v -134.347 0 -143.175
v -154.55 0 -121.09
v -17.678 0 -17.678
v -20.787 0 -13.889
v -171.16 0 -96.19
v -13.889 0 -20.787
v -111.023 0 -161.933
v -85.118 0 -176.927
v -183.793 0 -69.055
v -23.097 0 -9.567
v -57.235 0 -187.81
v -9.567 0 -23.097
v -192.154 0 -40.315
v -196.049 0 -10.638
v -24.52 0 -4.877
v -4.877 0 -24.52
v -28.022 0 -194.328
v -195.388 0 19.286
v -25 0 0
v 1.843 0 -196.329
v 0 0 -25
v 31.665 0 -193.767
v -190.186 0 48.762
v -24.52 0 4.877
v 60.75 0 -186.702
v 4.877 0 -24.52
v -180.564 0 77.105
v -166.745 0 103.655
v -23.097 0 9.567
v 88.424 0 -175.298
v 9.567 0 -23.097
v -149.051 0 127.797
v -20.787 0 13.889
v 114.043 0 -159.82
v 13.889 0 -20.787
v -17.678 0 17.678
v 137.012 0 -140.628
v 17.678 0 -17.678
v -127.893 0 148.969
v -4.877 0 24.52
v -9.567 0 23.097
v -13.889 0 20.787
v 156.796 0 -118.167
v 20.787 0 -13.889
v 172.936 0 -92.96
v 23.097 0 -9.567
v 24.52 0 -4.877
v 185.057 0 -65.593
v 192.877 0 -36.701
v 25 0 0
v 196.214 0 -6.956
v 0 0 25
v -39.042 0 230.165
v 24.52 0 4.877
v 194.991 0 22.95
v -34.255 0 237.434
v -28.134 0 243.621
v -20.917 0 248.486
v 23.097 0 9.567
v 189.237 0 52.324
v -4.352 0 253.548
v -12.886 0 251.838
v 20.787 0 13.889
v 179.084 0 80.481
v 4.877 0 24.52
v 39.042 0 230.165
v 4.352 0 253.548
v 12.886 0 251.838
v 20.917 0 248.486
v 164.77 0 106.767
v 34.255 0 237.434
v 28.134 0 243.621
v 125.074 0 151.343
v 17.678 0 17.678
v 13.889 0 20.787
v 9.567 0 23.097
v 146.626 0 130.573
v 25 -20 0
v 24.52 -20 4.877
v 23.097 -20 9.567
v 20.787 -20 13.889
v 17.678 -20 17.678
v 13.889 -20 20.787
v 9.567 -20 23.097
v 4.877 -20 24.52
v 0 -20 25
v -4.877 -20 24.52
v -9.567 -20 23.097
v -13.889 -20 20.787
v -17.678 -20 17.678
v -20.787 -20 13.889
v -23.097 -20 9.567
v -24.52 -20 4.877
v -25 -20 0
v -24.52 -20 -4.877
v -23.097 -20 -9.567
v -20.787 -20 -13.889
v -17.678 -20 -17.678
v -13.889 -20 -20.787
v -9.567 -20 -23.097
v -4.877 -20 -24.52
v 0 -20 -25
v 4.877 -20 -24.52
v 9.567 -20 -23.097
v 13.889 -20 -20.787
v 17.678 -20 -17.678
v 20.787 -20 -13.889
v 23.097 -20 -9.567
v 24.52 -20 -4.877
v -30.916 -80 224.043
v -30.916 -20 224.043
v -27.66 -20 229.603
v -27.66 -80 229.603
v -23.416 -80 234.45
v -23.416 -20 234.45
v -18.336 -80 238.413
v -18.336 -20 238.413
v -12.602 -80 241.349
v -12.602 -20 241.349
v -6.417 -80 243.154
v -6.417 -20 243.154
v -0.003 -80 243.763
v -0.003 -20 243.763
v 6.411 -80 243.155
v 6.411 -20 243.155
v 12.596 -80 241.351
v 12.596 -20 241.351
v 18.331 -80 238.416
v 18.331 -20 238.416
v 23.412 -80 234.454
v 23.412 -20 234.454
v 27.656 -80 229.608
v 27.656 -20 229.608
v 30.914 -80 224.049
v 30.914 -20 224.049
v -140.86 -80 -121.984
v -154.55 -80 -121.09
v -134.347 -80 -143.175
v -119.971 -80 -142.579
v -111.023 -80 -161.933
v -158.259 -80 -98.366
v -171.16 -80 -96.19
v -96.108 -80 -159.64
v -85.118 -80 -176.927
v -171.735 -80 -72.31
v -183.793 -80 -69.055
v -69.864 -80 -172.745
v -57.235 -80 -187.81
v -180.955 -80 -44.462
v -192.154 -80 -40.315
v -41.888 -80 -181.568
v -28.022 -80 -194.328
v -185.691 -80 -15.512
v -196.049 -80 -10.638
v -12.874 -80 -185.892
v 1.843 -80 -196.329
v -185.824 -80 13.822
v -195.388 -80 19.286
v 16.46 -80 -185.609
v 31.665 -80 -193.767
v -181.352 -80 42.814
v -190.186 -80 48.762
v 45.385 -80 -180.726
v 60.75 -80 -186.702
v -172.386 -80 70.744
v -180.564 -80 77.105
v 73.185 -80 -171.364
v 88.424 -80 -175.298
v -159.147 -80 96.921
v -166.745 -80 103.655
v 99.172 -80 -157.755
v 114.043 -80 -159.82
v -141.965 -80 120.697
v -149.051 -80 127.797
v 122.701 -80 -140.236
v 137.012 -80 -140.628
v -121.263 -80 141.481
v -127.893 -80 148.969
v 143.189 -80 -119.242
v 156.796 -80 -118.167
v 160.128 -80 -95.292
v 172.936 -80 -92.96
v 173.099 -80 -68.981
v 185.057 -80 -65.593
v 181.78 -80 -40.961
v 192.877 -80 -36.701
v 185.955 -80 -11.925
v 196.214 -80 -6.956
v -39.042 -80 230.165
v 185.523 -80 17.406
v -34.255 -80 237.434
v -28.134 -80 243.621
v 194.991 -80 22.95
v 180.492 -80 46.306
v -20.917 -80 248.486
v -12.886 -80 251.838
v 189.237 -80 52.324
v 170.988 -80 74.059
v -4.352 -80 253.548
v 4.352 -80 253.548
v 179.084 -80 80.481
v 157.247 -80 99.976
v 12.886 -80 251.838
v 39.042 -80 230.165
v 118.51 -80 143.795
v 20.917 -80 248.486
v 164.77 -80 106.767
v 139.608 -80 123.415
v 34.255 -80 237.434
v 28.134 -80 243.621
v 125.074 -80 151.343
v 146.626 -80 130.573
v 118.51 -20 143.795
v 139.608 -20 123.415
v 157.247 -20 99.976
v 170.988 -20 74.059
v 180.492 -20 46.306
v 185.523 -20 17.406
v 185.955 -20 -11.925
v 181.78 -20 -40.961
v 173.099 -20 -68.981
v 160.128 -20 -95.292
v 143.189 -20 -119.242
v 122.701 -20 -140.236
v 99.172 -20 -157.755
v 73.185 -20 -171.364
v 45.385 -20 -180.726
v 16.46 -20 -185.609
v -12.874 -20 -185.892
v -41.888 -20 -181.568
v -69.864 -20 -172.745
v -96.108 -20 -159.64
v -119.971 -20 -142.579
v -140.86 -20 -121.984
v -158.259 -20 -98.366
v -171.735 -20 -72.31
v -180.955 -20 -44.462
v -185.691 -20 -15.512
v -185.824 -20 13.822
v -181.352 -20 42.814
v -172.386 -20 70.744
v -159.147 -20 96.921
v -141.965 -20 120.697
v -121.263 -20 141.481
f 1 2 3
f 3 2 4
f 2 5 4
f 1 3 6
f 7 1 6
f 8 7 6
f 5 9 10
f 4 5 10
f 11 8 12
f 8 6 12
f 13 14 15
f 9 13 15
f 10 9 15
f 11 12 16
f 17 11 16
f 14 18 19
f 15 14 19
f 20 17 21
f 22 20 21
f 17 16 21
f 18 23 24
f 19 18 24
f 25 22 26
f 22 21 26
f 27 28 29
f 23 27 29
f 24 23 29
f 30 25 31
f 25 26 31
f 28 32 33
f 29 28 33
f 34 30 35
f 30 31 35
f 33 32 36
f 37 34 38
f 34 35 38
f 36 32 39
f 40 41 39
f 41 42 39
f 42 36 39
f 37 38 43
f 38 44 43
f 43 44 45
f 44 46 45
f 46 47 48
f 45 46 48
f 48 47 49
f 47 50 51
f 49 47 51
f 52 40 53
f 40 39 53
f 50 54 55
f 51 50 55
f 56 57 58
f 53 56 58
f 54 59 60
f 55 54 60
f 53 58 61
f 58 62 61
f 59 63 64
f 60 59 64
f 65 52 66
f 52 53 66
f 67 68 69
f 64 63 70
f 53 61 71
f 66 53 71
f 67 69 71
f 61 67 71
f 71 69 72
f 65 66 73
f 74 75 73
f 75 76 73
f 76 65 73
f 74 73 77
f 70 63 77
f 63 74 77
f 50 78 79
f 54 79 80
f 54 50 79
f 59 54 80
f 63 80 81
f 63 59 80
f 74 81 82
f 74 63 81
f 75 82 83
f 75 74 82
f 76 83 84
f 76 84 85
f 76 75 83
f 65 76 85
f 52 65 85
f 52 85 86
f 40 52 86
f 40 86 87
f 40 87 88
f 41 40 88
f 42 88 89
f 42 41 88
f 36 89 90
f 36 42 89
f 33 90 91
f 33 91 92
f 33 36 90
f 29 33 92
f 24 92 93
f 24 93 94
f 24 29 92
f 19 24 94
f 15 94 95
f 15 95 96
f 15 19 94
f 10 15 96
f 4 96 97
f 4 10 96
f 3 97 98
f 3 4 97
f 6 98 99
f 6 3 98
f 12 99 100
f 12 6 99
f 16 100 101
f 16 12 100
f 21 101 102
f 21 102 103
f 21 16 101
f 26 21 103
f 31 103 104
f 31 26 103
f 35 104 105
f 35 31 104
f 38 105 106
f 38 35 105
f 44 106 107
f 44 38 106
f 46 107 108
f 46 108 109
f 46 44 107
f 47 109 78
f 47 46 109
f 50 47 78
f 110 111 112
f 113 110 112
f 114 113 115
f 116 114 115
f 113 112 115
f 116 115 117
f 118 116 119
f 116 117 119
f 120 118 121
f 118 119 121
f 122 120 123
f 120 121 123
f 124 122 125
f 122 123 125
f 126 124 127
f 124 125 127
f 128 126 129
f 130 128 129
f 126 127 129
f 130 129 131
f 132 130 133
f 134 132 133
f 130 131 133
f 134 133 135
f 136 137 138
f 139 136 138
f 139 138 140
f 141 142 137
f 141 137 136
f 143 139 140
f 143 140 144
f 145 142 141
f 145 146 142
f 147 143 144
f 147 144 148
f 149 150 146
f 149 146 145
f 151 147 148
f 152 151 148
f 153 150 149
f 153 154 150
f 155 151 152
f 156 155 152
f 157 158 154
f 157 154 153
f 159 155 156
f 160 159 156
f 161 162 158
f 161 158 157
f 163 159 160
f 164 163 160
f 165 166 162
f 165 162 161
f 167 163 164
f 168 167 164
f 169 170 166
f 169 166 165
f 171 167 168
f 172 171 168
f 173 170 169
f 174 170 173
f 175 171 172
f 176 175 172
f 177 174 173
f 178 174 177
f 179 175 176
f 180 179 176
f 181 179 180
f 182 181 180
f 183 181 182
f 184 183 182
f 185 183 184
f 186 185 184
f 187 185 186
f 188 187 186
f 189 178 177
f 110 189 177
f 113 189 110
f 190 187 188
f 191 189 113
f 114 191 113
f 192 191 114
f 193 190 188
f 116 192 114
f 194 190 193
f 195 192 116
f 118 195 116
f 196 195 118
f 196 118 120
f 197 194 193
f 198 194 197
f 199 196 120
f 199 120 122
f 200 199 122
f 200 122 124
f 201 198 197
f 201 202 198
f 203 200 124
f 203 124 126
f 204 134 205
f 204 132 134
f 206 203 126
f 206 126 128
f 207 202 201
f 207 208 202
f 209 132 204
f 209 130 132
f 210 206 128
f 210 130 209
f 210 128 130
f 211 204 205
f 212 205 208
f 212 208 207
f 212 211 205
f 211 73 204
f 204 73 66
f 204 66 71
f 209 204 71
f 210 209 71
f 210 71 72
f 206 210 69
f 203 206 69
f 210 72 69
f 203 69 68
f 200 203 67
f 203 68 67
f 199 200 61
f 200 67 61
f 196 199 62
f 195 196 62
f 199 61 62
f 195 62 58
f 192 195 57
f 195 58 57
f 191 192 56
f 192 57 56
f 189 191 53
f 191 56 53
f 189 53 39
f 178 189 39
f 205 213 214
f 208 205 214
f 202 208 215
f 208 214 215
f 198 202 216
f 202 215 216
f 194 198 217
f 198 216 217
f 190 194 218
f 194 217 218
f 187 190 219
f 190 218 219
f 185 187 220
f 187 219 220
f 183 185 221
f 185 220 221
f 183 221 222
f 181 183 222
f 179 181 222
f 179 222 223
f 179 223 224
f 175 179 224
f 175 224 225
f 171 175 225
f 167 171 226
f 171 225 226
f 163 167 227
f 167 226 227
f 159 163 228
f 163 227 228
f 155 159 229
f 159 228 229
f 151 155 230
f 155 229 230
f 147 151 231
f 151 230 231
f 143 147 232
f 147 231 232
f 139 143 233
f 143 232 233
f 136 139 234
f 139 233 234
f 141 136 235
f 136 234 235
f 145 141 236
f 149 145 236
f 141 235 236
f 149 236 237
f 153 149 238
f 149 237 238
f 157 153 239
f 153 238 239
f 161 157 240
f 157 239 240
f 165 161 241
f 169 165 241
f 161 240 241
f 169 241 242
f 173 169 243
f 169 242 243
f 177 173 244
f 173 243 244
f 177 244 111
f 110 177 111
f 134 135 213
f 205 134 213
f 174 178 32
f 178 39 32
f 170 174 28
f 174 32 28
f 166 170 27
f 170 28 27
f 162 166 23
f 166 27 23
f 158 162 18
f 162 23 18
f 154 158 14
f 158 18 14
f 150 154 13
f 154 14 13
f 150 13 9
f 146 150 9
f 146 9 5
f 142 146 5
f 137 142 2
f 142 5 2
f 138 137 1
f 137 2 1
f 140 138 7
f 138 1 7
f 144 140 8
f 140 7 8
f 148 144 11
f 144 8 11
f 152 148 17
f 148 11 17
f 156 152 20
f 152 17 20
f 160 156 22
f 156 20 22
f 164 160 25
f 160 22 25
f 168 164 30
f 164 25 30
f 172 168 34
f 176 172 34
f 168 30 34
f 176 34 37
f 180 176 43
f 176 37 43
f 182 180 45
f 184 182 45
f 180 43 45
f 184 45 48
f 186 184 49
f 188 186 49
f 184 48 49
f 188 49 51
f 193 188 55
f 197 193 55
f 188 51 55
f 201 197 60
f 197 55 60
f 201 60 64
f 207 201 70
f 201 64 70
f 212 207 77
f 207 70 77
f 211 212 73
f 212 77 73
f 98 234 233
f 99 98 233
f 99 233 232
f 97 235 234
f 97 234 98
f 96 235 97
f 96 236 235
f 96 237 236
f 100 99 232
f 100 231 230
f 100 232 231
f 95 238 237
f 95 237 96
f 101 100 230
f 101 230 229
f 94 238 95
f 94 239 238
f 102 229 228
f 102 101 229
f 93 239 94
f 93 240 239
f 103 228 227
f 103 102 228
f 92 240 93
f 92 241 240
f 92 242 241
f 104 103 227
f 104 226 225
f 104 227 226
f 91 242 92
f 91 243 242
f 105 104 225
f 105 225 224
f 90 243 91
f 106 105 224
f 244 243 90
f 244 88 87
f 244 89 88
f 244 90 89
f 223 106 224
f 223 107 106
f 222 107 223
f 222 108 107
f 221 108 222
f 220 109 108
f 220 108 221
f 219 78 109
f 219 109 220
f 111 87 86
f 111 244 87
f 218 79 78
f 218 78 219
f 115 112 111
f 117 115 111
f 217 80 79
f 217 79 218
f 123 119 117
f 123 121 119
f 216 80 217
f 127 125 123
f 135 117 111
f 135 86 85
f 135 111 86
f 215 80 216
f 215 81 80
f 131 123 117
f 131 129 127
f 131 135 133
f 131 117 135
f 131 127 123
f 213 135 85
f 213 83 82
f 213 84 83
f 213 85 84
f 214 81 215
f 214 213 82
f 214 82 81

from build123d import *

# Parameters (mm, degrees)
F0_R     = 25
F1_DEPTH = 20
F2_START = 20
F2_DEPTH = 60


with BuildPart() as f1:
    # F0 (on Front) → F1 (new body)
    with BuildSketch(Plane.XZ):
        with BuildLine():
            Line((-39.0416272934, 230.1646211462), (-127.893426815, 148.9686369788))
            ThreePointArc((-127.893426815, 148.9686369788), (1.8429896211, -196.3287722547), (125.0743198764, 151.3433114916))
            Line((125.0743198764, 151.3433114916), (39.0416272934, 230.1646211462))
            ThreePointArc((39.0416272934, 230.1646211462), (0, 253.7630542683), (-39.0416272934, 230.1646211462))
        make_face()
        with BuildLine():
            ThreePointArc((118.5096726545, 143.7953144771), (1.7986083479, -186.3287417074), (-121.2634079203, 141.480814522))
            Line((-121.2634079203, 141.480814522), (-30.9161716853, 224.0433827807))
            ThreePointArc((-30.9161716853, 224.0433827807), (-0.0030944403, 243.7630541279), (30.9135618095, 224.0489944464))
            Line((30.9135618095, 224.0489944464), (118.5096726545, 143.7953144771))
        make_face(mode=Mode.SUBTRACT)
        with BuildLine():
            Line((-30.9161716853, 224.0433827807), (-121.2634079203, 141.480814522))
            ThreePointArc((-121.2634079203, 141.480814522), (1.7986083479, -186.3287417074), (118.5096726545, 143.7953144771))
            Line((118.5096726545, 143.7953144771), (30.9135618095, 224.0489944464))
            ThreePointArc((30.9135618095, 224.0489944464), (-0.0030944403, 243.7630541279), (-30.9161716853, 224.0433827807))
        make_face()
        Circle(F0_R, mode=Mode.SUBTRACT)
    extrude(amount=F1_DEPTH)

    # F0 (on Front) → F2 (join)
    with BuildSketch(Plane.XZ.offset(F2_START)):
        with BuildLine():
            Line((-39.0416272934, 230.1646211462), (-127.893426815, 148.9686369788))
            ThreePointArc((-127.893426815, 148.9686369788), (1.8429896211, -196.3287722547), (125.0743198764, 151.3433114916))
            Line((125.0743198764, 151.3433114916), (39.0416272934, 230.1646211462))
            ThreePointArc((39.0416272934, 230.1646211462), (0, 253.7630542683), (-39.0416272934, 230.1646211462))
        make_face()
        with BuildLine():
            ThreePointArc((118.5096726545, 143.7953144771), (1.7986083479, -186.3287417074), (-121.2634079203, 141.480814522))
            Line((-121.2634079203, 141.480814522), (-30.9161716853, 224.0433827807))
            ThreePointArc((-30.9161716853, 224.0433827807), (-0.0030944403, 243.7630541279), (30.9135618095, 224.0489944464))
            Line((30.9135618095, 224.0489944464), (118.5096726545, 143.7953144771))
        make_face(mode=Mode.SUBTRACT)
    extrude(amount=F2_DEPTH)


solid = f1.part
